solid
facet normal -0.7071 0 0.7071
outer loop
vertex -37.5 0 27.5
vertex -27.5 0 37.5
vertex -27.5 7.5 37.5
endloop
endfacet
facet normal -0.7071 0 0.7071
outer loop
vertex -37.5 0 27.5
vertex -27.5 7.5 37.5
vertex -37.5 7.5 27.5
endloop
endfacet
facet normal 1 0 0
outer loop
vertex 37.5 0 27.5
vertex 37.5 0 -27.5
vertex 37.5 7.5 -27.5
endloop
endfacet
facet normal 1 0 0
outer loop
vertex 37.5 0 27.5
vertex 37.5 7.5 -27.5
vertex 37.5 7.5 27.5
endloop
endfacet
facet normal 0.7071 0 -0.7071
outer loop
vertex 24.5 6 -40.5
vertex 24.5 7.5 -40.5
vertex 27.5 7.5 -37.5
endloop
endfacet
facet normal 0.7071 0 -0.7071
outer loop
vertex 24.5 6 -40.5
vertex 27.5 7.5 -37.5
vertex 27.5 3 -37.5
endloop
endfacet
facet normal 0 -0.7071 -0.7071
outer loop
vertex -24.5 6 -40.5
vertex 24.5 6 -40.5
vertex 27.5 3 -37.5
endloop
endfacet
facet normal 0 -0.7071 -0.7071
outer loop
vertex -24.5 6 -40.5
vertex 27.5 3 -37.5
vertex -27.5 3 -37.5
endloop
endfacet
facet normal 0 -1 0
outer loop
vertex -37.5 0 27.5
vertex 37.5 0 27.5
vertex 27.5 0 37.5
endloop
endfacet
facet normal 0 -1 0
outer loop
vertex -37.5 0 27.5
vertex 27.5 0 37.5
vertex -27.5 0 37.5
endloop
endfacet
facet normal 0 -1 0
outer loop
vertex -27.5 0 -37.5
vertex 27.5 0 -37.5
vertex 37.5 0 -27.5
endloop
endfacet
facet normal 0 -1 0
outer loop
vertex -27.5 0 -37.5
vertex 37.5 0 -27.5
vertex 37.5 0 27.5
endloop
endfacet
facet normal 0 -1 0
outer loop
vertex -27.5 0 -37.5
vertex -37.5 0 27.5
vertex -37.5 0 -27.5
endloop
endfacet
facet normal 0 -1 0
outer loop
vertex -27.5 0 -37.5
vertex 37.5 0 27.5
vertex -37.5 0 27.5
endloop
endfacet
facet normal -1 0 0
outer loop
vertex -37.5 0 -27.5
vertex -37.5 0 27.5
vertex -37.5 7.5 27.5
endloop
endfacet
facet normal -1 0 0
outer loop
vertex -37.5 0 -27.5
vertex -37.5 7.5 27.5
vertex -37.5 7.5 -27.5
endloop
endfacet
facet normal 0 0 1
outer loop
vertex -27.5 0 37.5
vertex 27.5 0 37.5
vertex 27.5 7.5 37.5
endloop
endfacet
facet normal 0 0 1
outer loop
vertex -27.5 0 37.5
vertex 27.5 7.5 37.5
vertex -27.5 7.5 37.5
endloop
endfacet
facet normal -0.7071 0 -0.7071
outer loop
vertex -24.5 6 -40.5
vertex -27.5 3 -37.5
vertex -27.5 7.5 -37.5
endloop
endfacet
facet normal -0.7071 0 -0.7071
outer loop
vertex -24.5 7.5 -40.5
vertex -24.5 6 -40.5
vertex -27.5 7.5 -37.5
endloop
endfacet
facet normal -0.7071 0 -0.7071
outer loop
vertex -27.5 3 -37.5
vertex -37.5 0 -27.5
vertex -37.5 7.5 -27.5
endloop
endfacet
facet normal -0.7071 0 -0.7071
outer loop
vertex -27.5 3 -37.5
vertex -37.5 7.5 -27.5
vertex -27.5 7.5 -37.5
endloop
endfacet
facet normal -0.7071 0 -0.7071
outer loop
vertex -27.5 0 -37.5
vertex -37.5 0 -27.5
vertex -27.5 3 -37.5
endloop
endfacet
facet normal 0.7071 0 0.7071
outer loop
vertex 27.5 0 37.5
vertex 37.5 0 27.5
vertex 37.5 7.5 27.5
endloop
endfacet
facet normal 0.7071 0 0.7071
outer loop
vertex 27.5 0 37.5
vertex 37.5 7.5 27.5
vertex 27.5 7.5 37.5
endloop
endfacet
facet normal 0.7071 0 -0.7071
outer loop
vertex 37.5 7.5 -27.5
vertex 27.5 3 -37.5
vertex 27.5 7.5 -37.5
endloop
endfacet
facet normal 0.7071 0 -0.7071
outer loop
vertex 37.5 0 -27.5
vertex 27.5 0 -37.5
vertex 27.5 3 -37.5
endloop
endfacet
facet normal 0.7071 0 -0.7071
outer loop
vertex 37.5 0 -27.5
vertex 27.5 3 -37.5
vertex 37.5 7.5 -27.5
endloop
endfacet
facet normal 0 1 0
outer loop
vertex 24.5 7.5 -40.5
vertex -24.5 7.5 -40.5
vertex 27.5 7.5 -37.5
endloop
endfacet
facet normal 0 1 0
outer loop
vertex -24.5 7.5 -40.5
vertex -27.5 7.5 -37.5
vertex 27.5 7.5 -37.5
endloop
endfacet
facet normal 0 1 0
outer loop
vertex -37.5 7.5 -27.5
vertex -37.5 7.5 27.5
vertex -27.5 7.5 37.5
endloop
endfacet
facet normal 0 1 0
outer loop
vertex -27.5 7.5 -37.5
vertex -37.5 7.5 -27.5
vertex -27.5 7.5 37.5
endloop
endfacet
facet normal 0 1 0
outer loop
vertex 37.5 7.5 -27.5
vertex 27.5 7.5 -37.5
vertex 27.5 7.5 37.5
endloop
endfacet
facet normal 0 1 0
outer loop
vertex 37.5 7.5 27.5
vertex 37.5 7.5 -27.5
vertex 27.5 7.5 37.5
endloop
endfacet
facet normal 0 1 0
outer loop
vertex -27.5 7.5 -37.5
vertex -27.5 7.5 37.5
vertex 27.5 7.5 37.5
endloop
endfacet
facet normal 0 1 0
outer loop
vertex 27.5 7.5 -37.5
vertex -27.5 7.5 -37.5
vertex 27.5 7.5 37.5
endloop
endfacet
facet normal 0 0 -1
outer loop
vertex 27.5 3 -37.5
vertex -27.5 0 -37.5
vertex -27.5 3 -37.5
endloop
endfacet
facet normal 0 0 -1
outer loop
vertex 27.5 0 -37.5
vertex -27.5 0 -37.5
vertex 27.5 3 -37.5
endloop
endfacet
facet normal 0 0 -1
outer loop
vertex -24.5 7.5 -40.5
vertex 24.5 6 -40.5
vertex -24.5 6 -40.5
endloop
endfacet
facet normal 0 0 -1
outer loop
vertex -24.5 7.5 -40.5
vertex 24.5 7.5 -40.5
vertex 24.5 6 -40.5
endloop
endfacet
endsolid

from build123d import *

# Parameters (mm, degrees)
BOSS_EXTRUDE1_DEPTH = 7.5
BOSS_EXTRUDE4_DEPTH = 3
CHAMFER7_SIZE       = 3
CHAMFER8_SIZE       = 3


with BuildPart() as part:
    # Sketch1 → Boss-Extrude1 (new body)
    with BuildSketch(Plane(origin=(0, 0, 0), x_dir=(1, 0, 0), z_dir=(0, 1, 0))):
        Polygon((-37.5, 27.5), (-27.5, 37.5), (27.5, 37.5), (37.5, 27.5), (37.5, -27.5), (27.5, -37.5), (-27.5, -37.5), (-37.5, -27.5), align=None)
    extrude(amount=BOSS_EXTRUDE1_DEPTH)

    # Sketch8 → Boss-Extrude4 (add)
    with BuildSketch(Plane(origin=(0, 0, -37.5), x_dir=(-1, 0, 0), z_dir=(0, 0, -1))):
        Polygon((-25, 3), (25, 3), (27.5, 3), (27.5, 7.5), (25, 7.5), (-25, 7.5), (-27.5, 7.5), (-27.5, 3), align=None)
    extrude(amount=BOSS_EXTRUDE4_DEPTH)

    # Chamfer7
    chamfer7_edges = [part.edges().sort_by_distance(p)[0] for p in [
        (0, 3, -40.5),
    ]]
    chamfer(chamfer7_edges, length=CHAMFER7_SIZE - 0.0001)  # a hair under: the kernel refuses the full size

    # Chamfer8
    chamfer8_edges = [part.edges().sort_by_distance(p)[0] for p in [
        (-27.5, 6.74995, -40.5),
        (27.5, 6.74995, -40.5),
    ]]
    chamfer(chamfer8_edges, length=CHAMFER8_SIZE - 0.0001)  # a hair under: the kernel refuses the full size


solid = part.part
